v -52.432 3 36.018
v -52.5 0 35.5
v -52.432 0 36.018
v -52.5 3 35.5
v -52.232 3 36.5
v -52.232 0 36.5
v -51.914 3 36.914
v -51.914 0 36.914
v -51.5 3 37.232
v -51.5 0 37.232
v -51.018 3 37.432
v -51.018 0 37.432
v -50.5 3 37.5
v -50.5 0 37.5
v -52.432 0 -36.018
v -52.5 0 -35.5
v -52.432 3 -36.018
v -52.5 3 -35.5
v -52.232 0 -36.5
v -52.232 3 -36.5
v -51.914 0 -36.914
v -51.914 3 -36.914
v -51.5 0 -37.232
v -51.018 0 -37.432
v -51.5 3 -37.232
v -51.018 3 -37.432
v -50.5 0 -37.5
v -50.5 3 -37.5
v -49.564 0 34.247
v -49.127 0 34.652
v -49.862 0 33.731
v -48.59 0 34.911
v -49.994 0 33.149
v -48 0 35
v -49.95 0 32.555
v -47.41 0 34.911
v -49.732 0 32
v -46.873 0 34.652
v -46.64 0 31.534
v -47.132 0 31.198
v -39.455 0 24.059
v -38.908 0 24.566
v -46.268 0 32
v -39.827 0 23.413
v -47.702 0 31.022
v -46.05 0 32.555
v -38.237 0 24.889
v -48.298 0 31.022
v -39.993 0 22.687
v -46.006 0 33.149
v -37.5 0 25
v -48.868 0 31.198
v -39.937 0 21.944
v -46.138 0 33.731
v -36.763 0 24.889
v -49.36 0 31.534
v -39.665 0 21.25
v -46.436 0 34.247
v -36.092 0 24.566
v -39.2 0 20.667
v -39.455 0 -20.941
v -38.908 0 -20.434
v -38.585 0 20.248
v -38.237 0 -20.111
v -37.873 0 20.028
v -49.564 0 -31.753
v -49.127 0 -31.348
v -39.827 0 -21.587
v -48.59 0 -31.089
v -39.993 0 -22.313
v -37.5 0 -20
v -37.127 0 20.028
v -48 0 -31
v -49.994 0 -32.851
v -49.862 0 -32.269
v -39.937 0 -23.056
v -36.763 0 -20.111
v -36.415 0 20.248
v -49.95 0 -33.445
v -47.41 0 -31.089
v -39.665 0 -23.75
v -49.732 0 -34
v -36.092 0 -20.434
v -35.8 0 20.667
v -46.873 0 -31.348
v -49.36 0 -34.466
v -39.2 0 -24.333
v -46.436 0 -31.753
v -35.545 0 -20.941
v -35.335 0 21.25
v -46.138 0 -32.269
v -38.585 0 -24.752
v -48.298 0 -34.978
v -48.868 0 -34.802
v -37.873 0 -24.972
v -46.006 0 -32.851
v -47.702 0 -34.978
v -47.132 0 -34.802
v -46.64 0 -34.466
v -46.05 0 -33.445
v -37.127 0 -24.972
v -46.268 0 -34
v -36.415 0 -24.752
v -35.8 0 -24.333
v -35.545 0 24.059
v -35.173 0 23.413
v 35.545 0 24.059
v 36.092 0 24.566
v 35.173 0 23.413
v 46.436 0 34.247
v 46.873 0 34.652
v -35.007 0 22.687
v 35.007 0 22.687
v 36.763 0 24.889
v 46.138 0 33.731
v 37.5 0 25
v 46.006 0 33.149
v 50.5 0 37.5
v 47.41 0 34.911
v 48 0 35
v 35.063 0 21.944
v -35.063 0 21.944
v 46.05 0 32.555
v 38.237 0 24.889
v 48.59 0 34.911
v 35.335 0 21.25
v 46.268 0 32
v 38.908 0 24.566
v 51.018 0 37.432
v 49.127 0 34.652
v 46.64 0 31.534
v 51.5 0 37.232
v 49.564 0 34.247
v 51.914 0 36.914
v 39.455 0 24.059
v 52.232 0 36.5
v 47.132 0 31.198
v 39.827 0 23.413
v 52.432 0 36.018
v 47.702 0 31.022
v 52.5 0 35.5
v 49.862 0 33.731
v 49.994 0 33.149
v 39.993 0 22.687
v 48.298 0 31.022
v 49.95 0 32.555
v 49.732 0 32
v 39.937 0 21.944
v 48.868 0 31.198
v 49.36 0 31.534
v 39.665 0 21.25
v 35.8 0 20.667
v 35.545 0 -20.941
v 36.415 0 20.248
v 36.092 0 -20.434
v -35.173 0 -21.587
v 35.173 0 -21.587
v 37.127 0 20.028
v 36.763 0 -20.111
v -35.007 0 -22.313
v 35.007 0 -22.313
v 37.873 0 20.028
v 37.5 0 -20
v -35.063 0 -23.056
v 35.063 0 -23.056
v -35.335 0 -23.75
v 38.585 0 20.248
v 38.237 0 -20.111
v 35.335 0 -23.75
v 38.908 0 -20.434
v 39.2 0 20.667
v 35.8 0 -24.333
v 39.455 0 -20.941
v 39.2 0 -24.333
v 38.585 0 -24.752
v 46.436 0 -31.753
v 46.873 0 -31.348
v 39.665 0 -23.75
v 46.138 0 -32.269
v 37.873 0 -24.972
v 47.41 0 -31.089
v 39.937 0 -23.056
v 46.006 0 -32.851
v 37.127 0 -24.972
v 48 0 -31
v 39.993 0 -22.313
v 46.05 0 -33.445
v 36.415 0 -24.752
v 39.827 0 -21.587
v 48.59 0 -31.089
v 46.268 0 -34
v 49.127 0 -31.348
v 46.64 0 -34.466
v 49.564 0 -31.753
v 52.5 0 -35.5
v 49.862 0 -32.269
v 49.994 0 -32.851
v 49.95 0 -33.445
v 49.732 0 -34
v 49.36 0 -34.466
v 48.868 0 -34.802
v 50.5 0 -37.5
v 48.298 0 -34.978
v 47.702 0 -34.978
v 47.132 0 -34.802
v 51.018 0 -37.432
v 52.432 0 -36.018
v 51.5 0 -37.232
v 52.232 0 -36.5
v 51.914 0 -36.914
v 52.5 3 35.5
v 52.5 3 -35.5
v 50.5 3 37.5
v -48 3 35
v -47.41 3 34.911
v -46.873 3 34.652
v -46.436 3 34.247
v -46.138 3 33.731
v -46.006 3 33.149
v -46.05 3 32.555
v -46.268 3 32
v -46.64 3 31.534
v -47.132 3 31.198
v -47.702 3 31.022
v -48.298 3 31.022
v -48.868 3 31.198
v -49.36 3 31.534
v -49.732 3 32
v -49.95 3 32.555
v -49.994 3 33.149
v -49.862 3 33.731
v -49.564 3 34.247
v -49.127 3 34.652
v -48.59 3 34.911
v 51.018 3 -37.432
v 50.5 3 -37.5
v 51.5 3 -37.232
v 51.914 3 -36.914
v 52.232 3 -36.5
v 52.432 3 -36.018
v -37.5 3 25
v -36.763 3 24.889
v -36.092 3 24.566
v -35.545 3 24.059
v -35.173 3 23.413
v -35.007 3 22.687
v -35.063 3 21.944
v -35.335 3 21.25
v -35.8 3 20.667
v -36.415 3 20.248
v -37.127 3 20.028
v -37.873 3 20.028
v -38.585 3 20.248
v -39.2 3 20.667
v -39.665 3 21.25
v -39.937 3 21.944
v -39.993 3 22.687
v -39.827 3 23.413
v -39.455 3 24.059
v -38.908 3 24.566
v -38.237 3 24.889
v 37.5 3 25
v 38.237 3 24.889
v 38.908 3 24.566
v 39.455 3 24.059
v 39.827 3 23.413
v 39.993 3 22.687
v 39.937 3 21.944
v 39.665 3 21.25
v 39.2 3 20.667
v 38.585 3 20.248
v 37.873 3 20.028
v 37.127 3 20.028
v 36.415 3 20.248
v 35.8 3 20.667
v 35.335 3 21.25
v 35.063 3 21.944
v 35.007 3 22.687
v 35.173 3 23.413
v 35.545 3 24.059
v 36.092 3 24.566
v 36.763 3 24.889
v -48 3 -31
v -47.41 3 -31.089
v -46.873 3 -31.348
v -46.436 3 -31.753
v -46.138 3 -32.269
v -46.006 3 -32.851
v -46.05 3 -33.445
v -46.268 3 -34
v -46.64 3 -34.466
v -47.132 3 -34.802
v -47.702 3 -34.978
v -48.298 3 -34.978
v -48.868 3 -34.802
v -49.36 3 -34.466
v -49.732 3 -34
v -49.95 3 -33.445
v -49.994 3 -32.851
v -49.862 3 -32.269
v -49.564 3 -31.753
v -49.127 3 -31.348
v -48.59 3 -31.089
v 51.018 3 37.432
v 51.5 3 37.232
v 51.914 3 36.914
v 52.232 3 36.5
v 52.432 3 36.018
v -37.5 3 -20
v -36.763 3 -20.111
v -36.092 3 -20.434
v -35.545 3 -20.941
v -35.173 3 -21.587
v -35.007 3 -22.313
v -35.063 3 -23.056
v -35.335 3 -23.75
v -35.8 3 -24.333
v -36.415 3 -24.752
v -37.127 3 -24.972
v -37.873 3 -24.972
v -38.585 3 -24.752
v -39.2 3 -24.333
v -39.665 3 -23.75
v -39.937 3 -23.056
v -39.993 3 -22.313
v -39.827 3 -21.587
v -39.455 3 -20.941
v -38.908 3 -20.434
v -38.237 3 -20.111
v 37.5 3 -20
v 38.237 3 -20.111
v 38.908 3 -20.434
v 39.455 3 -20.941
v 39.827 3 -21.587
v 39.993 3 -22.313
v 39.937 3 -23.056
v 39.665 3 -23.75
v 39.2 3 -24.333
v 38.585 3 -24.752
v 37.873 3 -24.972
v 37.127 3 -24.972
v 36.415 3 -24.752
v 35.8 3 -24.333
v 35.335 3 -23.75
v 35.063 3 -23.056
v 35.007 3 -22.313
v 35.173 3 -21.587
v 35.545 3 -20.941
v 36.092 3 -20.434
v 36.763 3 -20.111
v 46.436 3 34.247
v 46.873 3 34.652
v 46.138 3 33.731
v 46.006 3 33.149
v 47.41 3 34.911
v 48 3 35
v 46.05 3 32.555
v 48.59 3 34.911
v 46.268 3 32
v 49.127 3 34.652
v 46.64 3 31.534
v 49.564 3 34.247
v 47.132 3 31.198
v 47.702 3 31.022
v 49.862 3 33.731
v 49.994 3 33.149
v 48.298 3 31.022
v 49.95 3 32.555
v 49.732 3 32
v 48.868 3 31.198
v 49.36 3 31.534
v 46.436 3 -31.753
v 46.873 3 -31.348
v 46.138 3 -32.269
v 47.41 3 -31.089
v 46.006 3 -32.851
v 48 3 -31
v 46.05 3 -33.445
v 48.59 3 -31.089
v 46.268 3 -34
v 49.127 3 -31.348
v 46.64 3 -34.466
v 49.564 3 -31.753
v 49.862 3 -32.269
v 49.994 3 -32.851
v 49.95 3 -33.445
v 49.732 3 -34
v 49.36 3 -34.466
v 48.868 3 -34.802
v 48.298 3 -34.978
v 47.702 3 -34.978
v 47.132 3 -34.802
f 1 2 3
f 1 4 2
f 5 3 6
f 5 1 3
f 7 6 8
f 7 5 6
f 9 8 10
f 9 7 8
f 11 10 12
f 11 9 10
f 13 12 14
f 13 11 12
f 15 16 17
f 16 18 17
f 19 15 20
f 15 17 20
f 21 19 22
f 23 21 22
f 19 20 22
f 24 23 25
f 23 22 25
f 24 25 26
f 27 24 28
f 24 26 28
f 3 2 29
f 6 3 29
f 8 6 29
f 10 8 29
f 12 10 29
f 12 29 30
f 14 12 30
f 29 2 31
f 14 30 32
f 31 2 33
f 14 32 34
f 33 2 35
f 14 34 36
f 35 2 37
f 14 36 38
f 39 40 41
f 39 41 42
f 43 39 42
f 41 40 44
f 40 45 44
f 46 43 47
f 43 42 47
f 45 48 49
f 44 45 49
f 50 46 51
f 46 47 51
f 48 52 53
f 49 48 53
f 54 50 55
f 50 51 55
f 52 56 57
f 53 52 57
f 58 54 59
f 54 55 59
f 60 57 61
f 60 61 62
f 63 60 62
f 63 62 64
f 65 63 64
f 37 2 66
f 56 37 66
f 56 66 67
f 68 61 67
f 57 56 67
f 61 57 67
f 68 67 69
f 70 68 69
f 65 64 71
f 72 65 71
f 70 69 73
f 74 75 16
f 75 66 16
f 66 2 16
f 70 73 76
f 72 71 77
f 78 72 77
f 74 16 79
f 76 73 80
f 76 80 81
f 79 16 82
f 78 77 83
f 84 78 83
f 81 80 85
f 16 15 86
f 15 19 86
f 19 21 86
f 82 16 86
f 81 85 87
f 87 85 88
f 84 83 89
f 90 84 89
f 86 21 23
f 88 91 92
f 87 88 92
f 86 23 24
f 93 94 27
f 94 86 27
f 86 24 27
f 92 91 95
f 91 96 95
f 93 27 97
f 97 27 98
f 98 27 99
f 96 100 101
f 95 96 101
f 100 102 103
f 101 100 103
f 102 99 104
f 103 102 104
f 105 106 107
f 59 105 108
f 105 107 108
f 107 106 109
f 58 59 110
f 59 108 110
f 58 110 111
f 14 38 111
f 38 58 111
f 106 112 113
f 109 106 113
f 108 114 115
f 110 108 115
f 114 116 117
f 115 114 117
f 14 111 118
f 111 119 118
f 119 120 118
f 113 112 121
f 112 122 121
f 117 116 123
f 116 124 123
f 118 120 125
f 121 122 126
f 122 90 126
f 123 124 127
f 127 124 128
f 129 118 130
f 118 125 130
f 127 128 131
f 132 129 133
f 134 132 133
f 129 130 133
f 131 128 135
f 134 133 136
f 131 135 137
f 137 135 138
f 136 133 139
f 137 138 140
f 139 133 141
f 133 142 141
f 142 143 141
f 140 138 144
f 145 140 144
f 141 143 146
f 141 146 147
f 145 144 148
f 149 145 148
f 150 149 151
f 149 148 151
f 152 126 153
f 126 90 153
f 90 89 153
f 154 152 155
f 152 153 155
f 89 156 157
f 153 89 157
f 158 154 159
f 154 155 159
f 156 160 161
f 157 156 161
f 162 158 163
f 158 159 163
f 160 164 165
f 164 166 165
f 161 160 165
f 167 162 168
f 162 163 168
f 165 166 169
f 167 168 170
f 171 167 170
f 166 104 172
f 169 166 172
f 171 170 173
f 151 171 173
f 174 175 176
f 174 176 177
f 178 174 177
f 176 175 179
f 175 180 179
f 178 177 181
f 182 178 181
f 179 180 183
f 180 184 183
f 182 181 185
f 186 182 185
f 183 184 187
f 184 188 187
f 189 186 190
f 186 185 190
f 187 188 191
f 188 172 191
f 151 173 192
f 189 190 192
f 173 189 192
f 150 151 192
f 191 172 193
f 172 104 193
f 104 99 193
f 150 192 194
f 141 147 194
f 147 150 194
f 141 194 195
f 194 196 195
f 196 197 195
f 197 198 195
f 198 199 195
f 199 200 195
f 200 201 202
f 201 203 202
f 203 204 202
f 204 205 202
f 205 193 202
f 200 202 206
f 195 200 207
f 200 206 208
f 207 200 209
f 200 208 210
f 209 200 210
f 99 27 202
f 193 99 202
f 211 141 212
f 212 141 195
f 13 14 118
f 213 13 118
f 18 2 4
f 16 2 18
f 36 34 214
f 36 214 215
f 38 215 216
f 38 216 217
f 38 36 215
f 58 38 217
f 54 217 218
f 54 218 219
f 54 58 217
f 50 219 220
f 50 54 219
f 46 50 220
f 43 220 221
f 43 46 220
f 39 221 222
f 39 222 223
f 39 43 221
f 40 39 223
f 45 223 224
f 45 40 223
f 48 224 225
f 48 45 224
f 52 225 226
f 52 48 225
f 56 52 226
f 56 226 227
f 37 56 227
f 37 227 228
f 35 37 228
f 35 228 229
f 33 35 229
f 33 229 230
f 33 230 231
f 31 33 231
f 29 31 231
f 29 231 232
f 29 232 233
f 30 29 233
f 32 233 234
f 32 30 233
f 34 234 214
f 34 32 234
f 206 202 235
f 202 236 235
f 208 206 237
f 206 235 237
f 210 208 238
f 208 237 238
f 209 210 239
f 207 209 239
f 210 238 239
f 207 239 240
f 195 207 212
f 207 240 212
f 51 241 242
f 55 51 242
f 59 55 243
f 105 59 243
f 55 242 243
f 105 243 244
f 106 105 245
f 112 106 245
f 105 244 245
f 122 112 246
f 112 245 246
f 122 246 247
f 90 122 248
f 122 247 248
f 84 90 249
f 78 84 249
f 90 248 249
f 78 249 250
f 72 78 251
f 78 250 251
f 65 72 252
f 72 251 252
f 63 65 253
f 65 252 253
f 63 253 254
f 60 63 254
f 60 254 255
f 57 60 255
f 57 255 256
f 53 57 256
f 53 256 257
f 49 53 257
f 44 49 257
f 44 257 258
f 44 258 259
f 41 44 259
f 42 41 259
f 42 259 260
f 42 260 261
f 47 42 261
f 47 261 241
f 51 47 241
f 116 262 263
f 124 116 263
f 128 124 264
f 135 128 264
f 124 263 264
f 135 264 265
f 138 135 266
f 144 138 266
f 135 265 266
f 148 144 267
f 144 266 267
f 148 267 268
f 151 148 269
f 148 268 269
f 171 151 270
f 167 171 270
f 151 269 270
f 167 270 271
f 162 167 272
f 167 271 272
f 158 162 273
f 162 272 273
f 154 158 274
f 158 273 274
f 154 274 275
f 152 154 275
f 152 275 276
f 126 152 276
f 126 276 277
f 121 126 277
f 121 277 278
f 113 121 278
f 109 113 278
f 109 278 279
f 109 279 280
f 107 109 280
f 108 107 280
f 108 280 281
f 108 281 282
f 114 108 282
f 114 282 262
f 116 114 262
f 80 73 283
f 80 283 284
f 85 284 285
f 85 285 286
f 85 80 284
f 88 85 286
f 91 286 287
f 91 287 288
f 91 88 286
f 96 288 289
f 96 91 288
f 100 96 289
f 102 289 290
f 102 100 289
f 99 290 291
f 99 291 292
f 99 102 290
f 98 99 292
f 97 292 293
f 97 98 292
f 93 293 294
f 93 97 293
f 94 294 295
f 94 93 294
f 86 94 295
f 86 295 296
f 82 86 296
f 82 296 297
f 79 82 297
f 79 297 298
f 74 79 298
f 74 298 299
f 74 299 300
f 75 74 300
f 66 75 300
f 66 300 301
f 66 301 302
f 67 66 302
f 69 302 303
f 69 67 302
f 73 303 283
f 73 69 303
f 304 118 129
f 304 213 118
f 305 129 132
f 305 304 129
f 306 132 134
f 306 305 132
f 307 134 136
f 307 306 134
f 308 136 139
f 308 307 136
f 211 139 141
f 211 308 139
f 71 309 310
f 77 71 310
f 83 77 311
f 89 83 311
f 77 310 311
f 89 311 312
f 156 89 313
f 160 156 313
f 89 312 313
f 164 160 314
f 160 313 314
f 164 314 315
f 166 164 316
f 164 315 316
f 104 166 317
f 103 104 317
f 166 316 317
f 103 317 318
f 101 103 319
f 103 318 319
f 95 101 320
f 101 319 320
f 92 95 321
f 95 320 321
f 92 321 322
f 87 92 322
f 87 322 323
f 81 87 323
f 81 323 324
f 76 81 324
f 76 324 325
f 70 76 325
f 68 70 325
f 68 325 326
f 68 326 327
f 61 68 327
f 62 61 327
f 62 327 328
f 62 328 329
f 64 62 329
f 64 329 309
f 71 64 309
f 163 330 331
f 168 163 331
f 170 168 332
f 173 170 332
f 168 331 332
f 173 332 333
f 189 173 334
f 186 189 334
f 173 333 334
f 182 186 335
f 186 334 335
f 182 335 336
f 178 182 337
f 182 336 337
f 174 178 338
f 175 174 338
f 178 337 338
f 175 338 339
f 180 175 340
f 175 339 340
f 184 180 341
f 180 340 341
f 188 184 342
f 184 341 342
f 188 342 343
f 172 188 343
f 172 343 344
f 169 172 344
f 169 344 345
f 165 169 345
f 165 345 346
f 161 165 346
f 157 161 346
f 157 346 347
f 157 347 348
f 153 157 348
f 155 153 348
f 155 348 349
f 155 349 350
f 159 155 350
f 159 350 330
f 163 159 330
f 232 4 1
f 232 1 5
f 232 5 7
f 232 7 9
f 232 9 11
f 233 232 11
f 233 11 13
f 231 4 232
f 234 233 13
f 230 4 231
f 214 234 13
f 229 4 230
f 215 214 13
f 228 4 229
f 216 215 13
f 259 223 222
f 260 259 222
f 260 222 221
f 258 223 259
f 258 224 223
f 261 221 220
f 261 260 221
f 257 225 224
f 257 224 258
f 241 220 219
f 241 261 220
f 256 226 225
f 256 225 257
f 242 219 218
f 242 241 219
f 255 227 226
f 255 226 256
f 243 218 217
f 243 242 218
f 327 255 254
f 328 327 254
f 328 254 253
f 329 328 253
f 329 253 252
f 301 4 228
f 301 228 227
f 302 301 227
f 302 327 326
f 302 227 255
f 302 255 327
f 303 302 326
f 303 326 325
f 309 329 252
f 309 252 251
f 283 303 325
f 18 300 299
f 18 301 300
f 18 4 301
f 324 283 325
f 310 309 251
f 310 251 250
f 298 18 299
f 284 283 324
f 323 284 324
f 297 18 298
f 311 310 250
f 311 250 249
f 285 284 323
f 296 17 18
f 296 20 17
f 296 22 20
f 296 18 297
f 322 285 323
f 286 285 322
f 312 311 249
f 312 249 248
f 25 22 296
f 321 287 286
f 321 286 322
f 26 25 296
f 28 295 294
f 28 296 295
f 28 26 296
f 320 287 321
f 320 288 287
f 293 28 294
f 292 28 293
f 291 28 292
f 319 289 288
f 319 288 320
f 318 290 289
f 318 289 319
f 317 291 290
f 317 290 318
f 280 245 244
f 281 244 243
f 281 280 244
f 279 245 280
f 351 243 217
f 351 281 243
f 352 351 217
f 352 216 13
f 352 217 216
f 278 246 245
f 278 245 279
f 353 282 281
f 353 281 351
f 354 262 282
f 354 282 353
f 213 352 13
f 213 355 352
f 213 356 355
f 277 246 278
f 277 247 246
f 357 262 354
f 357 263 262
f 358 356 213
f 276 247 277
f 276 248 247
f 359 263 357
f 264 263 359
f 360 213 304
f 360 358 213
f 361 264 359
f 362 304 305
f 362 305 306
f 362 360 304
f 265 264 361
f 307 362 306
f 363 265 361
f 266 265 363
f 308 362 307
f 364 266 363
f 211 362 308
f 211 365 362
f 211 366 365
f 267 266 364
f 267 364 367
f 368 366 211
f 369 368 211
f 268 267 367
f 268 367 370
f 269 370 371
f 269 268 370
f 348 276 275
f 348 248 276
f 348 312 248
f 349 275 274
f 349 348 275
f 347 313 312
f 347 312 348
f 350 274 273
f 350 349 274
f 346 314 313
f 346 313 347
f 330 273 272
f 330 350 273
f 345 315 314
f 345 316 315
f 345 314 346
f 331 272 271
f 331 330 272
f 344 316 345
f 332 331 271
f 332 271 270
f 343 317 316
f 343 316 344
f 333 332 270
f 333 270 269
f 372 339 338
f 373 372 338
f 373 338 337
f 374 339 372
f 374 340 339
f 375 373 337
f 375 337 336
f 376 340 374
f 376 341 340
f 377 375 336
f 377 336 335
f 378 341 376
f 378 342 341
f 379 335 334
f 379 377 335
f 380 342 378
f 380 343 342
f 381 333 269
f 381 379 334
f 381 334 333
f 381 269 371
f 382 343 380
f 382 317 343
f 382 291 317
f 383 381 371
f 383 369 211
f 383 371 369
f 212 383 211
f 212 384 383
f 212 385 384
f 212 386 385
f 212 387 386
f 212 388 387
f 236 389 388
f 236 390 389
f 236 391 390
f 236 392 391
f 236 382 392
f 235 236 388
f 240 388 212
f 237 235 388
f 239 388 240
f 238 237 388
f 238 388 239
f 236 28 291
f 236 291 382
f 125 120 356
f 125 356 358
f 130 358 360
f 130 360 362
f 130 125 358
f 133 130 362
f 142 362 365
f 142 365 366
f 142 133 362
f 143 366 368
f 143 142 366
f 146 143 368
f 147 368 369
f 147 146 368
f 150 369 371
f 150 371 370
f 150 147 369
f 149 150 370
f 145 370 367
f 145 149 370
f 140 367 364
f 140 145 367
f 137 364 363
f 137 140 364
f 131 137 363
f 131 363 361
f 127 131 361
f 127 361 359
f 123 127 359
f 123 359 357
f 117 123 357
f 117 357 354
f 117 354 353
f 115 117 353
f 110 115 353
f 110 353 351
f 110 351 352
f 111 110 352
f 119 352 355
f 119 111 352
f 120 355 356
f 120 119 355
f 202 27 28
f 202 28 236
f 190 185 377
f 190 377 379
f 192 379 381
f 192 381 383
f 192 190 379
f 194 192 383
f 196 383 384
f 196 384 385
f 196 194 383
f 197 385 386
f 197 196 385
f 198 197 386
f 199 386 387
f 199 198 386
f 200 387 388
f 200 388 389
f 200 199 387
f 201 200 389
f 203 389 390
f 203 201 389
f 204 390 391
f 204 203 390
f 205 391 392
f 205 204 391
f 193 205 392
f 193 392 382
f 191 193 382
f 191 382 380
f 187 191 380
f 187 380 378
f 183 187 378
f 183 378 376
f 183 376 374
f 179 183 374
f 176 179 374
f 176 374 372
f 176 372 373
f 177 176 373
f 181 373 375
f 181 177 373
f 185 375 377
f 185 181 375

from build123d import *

# Parameters (mm, degrees)
SKETCH_1_W          = 105
SKETCH_1_H          = 75
SKETCH_1_R          = 2
EXTRUDE_1_DEPTH     = 3
FILLET_1_R          = 2
SKETCH_2_R          = 2.5
CUT_EXTRUDE_1_DEPTH = 10


with BuildPart() as part:
    # 스케치1 → 보스-돌출1 (new body)
    with BuildSketch(Plane(origin=(0, 0, 0), x_dir=(1, 0, 0), z_dir=(0, 1, 0))):
        Rectangle(SKETCH_1_W, SKETCH_1_H)
        with Locations(Location((-48, 33, 0), (0, 0, 270))):
            Circle(SKETCH_1_R, mode=Mode.SUBTRACT)
        with Locations(Location((-48, -33, 0), (0, 0, 270))):
            Circle(SKETCH_1_R, mode=Mode.SUBTRACT)
        with Locations(Location((48, -33, 0), (0, 0, 270))):
            Circle(SKETCH_1_R, mode=Mode.SUBTRACT)
        with Locations(Location((48, 33, 0), (0, 0, 270))):
            Circle(SKETCH_1_R, mode=Mode.SUBTRACT)
    extrude(amount=EXTRUDE_1_DEPTH)

    # 필렛1
    fillet_1_edges = [part.edges().sort_by_distance(p)[0] for p in [
        (52.5, 1.5, 37.5),
        (-52.5, 1.5, 37.5),
        (-52.5, 1.5, -37.5),
        (52.5, 1.5, -37.5),
    ]]
    fillet(fillet_1_edges, radius=FILLET_1_R)

    # 스케치2 → 컷-돌출1 (cut)
    with BuildSketch(Plane(origin=(0, 3, 0), x_dir=(1, 0, 0), z_dir=(0, 1, 0))):
        with Locations(Location((-37.5, -22.5, 0), (0, 0, 270))):
            Circle(SKETCH_2_R)
        with Locations(Location((37.5, -22.5, 0), (0, 0, 270))):
            Circle(SKETCH_2_R)
        with Locations(Location((37.5, 22.5, 0), (0, 0, 270))):
            Circle(SKETCH_2_R)
        with Locations(Location((-37.5, 22.5, 0), (0, 0, 270))):
            Circle(SKETCH_2_R)
    extrude(amount=-CUT_EXTRUDE_1_DEPTH, mode=Mode.SUBTRACT)


solid = part.part
